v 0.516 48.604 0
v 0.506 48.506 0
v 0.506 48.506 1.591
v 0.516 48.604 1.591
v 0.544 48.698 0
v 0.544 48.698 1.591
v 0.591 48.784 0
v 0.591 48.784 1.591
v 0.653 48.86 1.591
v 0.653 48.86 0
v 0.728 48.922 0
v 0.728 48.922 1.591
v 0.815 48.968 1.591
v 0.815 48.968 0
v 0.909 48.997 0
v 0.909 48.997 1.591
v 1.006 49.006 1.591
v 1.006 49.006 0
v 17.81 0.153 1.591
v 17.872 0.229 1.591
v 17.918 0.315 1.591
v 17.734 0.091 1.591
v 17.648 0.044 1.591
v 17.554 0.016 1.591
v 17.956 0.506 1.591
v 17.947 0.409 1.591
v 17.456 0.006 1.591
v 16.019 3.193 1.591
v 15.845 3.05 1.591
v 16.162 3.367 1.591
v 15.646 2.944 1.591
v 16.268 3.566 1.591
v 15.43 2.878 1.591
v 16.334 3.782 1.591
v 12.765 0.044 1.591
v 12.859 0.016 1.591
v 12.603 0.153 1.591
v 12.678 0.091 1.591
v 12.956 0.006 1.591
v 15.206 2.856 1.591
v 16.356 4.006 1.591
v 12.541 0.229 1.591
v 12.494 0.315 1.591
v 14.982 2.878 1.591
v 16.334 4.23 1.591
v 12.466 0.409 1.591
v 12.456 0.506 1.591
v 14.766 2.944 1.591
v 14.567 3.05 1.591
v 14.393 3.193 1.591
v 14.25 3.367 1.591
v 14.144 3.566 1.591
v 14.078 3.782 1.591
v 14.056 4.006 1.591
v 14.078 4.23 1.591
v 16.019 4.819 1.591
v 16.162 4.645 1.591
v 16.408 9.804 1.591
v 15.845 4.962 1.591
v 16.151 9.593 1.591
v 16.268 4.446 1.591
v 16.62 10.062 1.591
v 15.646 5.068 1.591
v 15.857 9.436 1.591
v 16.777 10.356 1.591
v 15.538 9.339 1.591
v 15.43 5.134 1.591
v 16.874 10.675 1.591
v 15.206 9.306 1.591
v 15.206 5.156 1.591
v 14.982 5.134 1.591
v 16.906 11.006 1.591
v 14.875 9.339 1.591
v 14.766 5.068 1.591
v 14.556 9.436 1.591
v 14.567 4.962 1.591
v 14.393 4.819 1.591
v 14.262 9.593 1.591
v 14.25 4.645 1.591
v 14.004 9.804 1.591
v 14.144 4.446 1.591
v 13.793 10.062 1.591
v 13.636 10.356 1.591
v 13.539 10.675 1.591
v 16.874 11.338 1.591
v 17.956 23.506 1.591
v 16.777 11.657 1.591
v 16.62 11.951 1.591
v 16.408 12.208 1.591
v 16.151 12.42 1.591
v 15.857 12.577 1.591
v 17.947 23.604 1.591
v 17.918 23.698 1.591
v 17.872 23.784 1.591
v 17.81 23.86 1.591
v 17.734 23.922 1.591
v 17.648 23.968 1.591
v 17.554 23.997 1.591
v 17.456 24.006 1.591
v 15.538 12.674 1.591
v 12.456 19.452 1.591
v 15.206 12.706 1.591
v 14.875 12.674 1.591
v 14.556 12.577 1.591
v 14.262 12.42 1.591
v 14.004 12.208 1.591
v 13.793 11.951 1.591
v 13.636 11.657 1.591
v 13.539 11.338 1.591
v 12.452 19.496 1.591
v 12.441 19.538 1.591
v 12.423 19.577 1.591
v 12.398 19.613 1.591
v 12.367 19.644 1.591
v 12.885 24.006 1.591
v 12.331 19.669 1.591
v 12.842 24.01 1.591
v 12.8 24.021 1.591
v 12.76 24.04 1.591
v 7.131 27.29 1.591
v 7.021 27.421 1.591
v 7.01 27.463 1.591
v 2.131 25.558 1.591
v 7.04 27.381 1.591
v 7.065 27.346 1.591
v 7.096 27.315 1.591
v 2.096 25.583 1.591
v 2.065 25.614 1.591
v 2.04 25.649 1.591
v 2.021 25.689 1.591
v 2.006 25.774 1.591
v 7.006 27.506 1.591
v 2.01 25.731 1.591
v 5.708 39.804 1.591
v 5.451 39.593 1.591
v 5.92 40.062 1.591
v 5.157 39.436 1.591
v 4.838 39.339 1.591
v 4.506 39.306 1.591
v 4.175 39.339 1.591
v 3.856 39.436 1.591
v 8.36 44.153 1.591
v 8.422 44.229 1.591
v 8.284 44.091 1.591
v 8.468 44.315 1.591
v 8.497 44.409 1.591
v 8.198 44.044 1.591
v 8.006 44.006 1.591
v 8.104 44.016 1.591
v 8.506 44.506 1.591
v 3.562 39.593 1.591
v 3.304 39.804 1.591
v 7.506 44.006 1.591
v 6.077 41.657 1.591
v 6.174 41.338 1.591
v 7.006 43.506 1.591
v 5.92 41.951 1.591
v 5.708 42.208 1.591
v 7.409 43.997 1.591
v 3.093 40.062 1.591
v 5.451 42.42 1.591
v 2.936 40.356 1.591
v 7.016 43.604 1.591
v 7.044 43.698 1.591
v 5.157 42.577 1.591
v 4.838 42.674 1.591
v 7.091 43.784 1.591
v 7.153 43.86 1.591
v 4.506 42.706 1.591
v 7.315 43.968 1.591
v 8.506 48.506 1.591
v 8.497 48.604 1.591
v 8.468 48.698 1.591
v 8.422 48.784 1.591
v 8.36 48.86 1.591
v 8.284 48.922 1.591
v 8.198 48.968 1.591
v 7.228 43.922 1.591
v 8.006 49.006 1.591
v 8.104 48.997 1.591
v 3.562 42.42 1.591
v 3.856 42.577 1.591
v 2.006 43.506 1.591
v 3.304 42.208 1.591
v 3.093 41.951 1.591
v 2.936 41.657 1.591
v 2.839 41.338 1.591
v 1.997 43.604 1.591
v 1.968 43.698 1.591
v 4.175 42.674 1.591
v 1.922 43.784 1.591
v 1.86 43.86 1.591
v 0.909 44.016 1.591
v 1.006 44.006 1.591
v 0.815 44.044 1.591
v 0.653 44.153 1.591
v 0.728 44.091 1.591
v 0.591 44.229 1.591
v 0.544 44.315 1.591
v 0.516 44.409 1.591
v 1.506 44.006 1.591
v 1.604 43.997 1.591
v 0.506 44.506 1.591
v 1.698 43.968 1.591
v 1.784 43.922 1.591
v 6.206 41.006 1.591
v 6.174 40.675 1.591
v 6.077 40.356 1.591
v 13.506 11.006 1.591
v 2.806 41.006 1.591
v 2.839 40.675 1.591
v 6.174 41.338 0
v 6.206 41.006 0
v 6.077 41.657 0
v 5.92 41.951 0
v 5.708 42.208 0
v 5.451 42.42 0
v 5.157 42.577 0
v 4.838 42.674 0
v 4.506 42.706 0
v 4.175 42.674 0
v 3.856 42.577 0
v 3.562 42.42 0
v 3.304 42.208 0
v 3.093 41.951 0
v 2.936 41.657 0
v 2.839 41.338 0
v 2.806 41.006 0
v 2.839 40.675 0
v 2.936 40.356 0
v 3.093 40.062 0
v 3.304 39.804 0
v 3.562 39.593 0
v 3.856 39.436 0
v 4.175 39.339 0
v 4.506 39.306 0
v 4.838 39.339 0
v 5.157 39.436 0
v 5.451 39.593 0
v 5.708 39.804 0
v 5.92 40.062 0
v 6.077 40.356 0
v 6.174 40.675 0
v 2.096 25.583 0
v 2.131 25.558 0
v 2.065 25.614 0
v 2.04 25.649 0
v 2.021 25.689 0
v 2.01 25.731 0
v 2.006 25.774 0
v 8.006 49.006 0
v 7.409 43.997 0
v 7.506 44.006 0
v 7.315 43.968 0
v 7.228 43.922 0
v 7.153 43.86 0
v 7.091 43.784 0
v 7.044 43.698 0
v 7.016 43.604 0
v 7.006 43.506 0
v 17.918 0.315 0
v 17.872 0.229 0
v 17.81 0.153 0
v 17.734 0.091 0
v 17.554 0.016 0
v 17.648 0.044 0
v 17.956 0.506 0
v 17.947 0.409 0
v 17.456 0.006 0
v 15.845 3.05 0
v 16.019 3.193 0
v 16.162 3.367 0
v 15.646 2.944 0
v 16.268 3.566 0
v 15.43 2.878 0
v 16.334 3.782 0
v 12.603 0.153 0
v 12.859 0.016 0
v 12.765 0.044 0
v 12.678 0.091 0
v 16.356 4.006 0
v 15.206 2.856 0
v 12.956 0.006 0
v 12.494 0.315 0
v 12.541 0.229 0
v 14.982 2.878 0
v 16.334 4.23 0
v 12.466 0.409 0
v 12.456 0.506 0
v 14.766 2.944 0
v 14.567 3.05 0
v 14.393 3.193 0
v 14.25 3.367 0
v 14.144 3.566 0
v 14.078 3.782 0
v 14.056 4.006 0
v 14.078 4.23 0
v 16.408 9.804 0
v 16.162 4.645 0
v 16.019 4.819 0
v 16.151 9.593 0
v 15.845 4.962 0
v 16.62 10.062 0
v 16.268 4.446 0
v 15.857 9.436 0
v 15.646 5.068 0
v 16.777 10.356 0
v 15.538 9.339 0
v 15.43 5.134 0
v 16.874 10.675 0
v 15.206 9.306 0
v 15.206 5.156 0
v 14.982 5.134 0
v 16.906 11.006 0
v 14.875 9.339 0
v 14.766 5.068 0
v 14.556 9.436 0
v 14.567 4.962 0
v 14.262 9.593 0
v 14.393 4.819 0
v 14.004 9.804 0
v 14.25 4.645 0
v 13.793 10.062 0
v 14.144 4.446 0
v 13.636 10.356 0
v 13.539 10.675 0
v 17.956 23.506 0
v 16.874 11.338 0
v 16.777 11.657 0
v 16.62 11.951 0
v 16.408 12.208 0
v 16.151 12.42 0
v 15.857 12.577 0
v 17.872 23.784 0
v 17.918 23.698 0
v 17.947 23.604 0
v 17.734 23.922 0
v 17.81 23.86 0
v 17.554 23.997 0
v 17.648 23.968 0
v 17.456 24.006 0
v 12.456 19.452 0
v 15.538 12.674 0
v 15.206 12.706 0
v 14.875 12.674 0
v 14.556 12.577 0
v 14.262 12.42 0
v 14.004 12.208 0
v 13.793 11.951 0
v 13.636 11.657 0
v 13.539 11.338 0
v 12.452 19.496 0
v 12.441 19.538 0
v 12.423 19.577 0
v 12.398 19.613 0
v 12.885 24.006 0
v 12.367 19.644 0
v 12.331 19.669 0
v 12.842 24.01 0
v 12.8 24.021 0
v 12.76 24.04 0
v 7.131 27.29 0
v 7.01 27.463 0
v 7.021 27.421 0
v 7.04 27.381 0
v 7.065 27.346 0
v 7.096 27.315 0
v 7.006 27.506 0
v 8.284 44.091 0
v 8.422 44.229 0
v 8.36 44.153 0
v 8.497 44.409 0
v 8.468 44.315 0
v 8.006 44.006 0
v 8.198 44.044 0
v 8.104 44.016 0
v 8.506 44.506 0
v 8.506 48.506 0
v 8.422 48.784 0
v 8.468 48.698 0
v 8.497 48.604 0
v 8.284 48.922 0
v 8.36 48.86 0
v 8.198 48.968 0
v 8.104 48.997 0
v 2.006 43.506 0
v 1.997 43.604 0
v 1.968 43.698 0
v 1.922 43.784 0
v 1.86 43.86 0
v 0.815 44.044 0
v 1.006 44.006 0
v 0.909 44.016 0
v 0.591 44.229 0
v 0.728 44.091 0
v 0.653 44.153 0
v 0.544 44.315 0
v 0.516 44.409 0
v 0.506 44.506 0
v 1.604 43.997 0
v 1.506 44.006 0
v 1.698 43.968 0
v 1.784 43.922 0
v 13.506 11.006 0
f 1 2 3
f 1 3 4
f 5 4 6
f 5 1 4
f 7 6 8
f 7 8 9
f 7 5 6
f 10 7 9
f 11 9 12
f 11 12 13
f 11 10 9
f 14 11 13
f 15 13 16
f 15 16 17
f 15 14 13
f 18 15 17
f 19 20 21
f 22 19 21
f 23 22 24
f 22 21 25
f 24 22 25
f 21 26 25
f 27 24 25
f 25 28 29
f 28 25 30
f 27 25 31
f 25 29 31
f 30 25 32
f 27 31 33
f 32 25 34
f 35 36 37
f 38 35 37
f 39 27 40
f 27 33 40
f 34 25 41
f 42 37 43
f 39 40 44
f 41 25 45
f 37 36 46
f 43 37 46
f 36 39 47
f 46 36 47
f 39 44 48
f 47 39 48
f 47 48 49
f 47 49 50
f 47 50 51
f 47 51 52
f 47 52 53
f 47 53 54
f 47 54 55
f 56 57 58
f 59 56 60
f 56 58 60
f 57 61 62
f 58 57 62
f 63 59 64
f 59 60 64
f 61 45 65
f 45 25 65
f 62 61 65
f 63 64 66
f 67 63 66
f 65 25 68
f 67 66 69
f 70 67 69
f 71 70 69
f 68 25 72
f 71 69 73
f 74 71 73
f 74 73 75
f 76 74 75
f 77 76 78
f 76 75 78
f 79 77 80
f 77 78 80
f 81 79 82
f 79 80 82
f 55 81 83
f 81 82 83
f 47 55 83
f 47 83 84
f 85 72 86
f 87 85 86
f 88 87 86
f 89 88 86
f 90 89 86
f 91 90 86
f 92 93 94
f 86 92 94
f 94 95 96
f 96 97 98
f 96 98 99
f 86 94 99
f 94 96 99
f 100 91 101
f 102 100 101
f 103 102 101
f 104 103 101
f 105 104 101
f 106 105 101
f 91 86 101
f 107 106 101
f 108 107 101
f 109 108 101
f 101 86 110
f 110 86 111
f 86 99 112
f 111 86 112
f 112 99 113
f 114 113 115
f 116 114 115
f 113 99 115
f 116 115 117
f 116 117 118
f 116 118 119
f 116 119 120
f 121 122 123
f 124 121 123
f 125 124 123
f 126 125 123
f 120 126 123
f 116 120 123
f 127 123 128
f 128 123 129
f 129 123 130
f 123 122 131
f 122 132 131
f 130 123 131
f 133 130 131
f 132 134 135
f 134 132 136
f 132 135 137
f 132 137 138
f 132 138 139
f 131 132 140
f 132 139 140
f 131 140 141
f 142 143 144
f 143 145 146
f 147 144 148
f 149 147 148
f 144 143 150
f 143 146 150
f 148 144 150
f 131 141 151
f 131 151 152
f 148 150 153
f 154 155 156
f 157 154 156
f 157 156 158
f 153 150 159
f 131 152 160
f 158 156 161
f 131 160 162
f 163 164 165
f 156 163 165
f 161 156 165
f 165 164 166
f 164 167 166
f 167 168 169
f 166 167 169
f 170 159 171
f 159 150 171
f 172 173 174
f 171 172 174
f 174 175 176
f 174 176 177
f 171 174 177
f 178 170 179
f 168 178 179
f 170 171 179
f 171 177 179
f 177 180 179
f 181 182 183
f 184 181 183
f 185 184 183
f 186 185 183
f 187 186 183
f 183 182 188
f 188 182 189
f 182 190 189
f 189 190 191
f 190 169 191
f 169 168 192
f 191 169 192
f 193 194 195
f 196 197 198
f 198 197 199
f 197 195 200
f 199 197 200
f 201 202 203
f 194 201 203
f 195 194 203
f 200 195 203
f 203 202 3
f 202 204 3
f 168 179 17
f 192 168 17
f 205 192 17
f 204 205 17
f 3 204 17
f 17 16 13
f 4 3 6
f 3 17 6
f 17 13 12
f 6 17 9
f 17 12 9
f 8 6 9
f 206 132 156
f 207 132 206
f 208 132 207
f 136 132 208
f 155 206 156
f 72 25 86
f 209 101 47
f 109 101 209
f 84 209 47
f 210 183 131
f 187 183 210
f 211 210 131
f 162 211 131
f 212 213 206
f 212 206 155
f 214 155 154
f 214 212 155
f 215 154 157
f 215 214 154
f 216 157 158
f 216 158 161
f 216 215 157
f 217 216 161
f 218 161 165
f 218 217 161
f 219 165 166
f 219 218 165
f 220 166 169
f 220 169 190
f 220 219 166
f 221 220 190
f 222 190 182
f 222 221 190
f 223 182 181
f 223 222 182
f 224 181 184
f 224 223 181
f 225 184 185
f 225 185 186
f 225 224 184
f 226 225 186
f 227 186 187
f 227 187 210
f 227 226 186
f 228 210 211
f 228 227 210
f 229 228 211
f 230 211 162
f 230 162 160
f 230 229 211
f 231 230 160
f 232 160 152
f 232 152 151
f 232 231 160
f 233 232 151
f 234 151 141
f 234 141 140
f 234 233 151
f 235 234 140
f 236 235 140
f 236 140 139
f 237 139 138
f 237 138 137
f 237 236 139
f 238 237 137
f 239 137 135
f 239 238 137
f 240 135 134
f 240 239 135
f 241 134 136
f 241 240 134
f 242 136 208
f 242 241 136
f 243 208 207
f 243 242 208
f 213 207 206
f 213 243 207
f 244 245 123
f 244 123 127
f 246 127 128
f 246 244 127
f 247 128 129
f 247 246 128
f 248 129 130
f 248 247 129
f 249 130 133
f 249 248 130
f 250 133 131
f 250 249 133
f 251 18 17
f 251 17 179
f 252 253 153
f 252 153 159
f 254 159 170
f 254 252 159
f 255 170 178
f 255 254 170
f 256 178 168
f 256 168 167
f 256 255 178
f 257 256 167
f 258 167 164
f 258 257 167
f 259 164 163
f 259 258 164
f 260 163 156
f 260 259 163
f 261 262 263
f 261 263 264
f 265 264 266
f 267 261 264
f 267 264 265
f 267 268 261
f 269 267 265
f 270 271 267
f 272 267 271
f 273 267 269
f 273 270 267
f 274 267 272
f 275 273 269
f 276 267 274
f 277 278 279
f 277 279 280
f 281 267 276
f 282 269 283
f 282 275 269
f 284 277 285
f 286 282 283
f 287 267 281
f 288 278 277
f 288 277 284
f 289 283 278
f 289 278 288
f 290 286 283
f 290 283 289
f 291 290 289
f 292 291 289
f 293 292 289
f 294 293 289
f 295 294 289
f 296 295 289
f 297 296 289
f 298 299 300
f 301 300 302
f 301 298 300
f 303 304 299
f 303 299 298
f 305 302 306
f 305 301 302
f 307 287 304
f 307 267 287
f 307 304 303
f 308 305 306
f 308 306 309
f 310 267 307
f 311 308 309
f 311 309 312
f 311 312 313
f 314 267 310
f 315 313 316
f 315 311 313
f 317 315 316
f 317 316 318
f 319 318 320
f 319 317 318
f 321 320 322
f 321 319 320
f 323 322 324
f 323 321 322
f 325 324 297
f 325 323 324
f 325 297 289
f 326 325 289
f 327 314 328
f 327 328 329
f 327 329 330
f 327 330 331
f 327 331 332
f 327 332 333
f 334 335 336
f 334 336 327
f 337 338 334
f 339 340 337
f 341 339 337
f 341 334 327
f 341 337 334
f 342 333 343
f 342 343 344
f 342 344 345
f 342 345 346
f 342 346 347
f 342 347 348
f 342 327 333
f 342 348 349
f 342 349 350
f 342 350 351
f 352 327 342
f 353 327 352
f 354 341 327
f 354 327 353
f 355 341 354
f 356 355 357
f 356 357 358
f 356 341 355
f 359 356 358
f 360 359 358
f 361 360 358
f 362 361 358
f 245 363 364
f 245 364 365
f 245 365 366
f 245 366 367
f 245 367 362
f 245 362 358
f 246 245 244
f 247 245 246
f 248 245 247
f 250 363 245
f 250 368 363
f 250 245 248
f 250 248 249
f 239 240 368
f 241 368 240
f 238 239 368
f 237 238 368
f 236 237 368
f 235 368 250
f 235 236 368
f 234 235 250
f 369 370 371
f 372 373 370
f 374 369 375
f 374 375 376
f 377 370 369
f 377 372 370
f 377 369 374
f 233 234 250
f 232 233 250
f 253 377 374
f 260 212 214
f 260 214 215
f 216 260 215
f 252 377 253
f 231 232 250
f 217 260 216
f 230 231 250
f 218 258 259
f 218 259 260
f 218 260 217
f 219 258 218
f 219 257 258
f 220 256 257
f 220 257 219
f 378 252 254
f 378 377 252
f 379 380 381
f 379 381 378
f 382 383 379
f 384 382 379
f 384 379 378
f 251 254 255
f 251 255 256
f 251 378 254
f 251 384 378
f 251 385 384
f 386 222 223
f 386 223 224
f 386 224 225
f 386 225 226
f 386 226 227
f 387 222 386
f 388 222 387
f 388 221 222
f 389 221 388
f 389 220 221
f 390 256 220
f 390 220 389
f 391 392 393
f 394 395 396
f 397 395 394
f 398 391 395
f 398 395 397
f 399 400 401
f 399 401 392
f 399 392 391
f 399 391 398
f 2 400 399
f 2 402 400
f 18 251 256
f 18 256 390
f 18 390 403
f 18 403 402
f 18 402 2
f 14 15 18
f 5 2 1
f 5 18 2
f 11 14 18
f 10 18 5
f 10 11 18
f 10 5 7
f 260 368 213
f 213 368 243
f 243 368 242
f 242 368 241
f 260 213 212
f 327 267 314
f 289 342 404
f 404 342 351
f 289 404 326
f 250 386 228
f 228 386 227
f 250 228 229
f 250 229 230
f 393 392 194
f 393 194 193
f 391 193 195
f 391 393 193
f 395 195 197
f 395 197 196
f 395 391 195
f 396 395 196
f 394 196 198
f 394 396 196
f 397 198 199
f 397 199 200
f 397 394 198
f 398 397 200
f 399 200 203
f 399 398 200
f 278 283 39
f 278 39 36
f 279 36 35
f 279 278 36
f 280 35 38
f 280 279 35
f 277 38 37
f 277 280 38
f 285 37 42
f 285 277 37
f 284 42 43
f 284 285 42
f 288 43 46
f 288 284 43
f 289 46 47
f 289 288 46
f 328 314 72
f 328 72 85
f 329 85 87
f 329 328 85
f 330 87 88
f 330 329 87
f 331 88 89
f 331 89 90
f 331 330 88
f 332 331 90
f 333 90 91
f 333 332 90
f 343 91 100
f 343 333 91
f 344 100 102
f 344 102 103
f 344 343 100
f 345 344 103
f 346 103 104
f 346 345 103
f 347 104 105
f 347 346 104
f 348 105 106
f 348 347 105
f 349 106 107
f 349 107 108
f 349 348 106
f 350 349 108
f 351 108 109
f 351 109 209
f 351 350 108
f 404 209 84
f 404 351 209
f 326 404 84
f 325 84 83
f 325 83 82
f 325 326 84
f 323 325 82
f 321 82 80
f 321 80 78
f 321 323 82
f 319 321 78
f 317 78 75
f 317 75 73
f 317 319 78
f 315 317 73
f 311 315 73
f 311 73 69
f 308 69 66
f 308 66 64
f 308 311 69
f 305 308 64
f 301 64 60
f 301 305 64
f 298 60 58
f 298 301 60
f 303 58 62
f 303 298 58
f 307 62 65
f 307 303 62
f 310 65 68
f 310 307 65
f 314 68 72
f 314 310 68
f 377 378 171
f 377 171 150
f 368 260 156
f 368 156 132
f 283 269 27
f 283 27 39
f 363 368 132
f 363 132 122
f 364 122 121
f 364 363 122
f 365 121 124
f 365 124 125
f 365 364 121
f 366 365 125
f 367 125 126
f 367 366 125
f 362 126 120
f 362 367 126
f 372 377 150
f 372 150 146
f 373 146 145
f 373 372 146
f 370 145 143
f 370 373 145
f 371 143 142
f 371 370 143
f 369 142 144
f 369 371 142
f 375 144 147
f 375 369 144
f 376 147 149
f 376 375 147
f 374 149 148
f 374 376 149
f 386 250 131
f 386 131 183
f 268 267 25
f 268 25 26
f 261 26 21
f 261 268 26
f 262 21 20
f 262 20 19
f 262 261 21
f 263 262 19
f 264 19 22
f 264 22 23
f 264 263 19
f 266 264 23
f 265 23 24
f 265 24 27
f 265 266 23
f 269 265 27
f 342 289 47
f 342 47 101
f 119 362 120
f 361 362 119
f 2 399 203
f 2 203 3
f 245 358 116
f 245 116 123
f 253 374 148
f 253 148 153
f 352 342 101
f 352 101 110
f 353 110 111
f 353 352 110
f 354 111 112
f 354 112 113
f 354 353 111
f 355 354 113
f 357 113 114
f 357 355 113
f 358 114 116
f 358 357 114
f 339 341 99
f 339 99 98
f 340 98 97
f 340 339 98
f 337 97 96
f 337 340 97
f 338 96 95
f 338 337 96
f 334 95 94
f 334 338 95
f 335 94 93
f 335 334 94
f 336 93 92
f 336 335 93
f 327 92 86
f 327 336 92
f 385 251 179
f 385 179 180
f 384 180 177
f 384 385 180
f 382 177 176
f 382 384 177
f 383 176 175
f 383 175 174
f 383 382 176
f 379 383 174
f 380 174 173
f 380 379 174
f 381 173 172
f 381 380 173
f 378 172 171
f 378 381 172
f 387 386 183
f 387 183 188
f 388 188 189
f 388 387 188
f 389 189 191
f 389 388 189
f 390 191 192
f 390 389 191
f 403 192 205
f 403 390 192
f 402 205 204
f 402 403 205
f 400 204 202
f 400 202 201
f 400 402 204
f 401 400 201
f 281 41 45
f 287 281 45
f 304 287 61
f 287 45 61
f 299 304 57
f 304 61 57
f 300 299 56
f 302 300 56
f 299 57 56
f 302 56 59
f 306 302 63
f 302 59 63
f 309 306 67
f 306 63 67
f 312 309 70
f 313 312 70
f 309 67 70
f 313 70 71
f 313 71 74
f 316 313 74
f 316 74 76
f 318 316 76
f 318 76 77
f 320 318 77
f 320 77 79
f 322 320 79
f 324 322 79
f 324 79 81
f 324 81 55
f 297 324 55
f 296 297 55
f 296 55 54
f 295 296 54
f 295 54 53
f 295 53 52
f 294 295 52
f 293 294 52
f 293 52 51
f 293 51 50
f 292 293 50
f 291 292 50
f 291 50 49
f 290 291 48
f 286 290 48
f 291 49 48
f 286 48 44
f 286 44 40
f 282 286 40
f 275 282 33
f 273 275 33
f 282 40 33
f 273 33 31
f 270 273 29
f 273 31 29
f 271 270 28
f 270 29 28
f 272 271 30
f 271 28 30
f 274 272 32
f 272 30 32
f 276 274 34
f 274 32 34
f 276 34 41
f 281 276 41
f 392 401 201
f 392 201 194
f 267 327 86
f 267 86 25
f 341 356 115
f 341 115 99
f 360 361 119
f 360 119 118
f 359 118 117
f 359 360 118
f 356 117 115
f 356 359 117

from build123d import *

# Parameters (mm, degrees)
BOARD_DEPTH                  = 1.59144
M3_CLEARANCE_HOLE1_OUTLINE_R = 1.7
M3_CLEARANCE_HOLE1_DEPTH     = 1.59144
SKETCH7_R                    = 1.15
CUTOUT_2_DEPTH               = 53.216689419


# Read off the part's stored shape, not the designer's step: M3 Clearance Hole1
with BuildPart() as part:
    # Sketch1 → Board (new body)
    with BuildSketch(Plane.XY):
        with BuildLine():
            Line((8.00627, 44.00635), (7.50627, 44.00635))
            ThreePointArc((7.50627, 44.00635), (7.152716609, 43.859903391), (7.00627, 43.50635))
            Line((7.00627, 43.50635), (7.00627, 27.50635))
            ThreePointArc((7.00627, 27.50635), (7.039763649, 27.38135), (7.13127, 27.289843649))
            Line((7.13127, 27.289843649), (12.760435125, 24.039843649))
            ThreePointArc((12.760435125, 24.039843649), (12.820730363, 24.014868543), (12.885435125, 24.00635))
            Line((12.885435125, 24.00635), (17.45627, 24.00635))
            ThreePointArc((17.45627, 24.00635), (17.809823391, 23.859903391), (17.95627, 23.50635))
            Line((17.95627, 23.50635), (17.95627, 0.50635))
            ThreePointArc((17.95627, 0.50635), (17.809823391, 0.152796609), (17.45627, 0.00635))
            Line((17.45627, 0.00635), (12.95627, 0.00635))
            ThreePointArc((12.95627, 0.00635), (12.602716609, 0.152796609), (12.45627, 0.50635))
            Line((12.45627, 0.50635), (12.45627, 19.452313745))
            ThreePointArc((12.45627, 19.452313745), (12.422776351, 19.577313745), (12.33127, 19.668820096))
            Line((12.33127, 19.668820096), (2.13127, 25.557792841))
            ThreePointArc((2.13127, 25.557792841), (2.039763649, 25.649299192), (2.00627, 25.774299192))
            Line((2.00627, 25.774299192), (2.00627, 43.50635))
            ThreePointArc((2.00627, 43.50635), (1.859823391, 43.859903391), (1.50627, 44.00635))
            Line((1.50627, 44.00635), (1.00627, 44.00635))
            ThreePointArc((1.00627, 44.00635), (0.652716609, 44.152796609), (0.50627, 44.50635))
            Line((0.50627, 44.50635), (0.50627, 48.50635))
            ThreePointArc((0.50627, 48.50635), (0.652716609, 48.859903391), (1.00627, 49.00635))
            Line((1.00627, 49.00635), (8.00627, 49.00635))
            ThreePointArc((8.00627, 49.00635), (8.359823391, 48.859903391), (8.50627, 48.50635))
            Line((8.50627, 48.50635), (8.50627, 44.50635))
            ThreePointArc((8.50627, 44.50635), (8.359823391, 44.152796609), (8.00627, 44.00635))
        make_face()
    extrude(amount=BOARD_DEPTH)

    # M3 Clearance Hole1 outline → M3 Clearance Hole1 (cut)
    with BuildSketch(Plane.XY):
        with Locations((15.20627, 11.00635)):
            Circle(M3_CLEARANCE_HOLE1_OUTLINE_R)
        with Locations((4.50627, 41.00635)):
            Circle(M3_CLEARANCE_HOLE1_OUTLINE_R)
    extrude(amount=M3_CLEARANCE_HOLE1_DEPTH, mode=Mode.SUBTRACT)

    # Sketch7 → Cutout 2 (cut, through all)
    with BuildSketch(Plane.XY.offset(1.59144)):
        with Locations((15.206, 4.006)):
            Circle(SKETCH7_R)
    extrude(amount=-CUTOUT_2_DEPTH, mode=Mode.SUBTRACT)


solid = part.part
